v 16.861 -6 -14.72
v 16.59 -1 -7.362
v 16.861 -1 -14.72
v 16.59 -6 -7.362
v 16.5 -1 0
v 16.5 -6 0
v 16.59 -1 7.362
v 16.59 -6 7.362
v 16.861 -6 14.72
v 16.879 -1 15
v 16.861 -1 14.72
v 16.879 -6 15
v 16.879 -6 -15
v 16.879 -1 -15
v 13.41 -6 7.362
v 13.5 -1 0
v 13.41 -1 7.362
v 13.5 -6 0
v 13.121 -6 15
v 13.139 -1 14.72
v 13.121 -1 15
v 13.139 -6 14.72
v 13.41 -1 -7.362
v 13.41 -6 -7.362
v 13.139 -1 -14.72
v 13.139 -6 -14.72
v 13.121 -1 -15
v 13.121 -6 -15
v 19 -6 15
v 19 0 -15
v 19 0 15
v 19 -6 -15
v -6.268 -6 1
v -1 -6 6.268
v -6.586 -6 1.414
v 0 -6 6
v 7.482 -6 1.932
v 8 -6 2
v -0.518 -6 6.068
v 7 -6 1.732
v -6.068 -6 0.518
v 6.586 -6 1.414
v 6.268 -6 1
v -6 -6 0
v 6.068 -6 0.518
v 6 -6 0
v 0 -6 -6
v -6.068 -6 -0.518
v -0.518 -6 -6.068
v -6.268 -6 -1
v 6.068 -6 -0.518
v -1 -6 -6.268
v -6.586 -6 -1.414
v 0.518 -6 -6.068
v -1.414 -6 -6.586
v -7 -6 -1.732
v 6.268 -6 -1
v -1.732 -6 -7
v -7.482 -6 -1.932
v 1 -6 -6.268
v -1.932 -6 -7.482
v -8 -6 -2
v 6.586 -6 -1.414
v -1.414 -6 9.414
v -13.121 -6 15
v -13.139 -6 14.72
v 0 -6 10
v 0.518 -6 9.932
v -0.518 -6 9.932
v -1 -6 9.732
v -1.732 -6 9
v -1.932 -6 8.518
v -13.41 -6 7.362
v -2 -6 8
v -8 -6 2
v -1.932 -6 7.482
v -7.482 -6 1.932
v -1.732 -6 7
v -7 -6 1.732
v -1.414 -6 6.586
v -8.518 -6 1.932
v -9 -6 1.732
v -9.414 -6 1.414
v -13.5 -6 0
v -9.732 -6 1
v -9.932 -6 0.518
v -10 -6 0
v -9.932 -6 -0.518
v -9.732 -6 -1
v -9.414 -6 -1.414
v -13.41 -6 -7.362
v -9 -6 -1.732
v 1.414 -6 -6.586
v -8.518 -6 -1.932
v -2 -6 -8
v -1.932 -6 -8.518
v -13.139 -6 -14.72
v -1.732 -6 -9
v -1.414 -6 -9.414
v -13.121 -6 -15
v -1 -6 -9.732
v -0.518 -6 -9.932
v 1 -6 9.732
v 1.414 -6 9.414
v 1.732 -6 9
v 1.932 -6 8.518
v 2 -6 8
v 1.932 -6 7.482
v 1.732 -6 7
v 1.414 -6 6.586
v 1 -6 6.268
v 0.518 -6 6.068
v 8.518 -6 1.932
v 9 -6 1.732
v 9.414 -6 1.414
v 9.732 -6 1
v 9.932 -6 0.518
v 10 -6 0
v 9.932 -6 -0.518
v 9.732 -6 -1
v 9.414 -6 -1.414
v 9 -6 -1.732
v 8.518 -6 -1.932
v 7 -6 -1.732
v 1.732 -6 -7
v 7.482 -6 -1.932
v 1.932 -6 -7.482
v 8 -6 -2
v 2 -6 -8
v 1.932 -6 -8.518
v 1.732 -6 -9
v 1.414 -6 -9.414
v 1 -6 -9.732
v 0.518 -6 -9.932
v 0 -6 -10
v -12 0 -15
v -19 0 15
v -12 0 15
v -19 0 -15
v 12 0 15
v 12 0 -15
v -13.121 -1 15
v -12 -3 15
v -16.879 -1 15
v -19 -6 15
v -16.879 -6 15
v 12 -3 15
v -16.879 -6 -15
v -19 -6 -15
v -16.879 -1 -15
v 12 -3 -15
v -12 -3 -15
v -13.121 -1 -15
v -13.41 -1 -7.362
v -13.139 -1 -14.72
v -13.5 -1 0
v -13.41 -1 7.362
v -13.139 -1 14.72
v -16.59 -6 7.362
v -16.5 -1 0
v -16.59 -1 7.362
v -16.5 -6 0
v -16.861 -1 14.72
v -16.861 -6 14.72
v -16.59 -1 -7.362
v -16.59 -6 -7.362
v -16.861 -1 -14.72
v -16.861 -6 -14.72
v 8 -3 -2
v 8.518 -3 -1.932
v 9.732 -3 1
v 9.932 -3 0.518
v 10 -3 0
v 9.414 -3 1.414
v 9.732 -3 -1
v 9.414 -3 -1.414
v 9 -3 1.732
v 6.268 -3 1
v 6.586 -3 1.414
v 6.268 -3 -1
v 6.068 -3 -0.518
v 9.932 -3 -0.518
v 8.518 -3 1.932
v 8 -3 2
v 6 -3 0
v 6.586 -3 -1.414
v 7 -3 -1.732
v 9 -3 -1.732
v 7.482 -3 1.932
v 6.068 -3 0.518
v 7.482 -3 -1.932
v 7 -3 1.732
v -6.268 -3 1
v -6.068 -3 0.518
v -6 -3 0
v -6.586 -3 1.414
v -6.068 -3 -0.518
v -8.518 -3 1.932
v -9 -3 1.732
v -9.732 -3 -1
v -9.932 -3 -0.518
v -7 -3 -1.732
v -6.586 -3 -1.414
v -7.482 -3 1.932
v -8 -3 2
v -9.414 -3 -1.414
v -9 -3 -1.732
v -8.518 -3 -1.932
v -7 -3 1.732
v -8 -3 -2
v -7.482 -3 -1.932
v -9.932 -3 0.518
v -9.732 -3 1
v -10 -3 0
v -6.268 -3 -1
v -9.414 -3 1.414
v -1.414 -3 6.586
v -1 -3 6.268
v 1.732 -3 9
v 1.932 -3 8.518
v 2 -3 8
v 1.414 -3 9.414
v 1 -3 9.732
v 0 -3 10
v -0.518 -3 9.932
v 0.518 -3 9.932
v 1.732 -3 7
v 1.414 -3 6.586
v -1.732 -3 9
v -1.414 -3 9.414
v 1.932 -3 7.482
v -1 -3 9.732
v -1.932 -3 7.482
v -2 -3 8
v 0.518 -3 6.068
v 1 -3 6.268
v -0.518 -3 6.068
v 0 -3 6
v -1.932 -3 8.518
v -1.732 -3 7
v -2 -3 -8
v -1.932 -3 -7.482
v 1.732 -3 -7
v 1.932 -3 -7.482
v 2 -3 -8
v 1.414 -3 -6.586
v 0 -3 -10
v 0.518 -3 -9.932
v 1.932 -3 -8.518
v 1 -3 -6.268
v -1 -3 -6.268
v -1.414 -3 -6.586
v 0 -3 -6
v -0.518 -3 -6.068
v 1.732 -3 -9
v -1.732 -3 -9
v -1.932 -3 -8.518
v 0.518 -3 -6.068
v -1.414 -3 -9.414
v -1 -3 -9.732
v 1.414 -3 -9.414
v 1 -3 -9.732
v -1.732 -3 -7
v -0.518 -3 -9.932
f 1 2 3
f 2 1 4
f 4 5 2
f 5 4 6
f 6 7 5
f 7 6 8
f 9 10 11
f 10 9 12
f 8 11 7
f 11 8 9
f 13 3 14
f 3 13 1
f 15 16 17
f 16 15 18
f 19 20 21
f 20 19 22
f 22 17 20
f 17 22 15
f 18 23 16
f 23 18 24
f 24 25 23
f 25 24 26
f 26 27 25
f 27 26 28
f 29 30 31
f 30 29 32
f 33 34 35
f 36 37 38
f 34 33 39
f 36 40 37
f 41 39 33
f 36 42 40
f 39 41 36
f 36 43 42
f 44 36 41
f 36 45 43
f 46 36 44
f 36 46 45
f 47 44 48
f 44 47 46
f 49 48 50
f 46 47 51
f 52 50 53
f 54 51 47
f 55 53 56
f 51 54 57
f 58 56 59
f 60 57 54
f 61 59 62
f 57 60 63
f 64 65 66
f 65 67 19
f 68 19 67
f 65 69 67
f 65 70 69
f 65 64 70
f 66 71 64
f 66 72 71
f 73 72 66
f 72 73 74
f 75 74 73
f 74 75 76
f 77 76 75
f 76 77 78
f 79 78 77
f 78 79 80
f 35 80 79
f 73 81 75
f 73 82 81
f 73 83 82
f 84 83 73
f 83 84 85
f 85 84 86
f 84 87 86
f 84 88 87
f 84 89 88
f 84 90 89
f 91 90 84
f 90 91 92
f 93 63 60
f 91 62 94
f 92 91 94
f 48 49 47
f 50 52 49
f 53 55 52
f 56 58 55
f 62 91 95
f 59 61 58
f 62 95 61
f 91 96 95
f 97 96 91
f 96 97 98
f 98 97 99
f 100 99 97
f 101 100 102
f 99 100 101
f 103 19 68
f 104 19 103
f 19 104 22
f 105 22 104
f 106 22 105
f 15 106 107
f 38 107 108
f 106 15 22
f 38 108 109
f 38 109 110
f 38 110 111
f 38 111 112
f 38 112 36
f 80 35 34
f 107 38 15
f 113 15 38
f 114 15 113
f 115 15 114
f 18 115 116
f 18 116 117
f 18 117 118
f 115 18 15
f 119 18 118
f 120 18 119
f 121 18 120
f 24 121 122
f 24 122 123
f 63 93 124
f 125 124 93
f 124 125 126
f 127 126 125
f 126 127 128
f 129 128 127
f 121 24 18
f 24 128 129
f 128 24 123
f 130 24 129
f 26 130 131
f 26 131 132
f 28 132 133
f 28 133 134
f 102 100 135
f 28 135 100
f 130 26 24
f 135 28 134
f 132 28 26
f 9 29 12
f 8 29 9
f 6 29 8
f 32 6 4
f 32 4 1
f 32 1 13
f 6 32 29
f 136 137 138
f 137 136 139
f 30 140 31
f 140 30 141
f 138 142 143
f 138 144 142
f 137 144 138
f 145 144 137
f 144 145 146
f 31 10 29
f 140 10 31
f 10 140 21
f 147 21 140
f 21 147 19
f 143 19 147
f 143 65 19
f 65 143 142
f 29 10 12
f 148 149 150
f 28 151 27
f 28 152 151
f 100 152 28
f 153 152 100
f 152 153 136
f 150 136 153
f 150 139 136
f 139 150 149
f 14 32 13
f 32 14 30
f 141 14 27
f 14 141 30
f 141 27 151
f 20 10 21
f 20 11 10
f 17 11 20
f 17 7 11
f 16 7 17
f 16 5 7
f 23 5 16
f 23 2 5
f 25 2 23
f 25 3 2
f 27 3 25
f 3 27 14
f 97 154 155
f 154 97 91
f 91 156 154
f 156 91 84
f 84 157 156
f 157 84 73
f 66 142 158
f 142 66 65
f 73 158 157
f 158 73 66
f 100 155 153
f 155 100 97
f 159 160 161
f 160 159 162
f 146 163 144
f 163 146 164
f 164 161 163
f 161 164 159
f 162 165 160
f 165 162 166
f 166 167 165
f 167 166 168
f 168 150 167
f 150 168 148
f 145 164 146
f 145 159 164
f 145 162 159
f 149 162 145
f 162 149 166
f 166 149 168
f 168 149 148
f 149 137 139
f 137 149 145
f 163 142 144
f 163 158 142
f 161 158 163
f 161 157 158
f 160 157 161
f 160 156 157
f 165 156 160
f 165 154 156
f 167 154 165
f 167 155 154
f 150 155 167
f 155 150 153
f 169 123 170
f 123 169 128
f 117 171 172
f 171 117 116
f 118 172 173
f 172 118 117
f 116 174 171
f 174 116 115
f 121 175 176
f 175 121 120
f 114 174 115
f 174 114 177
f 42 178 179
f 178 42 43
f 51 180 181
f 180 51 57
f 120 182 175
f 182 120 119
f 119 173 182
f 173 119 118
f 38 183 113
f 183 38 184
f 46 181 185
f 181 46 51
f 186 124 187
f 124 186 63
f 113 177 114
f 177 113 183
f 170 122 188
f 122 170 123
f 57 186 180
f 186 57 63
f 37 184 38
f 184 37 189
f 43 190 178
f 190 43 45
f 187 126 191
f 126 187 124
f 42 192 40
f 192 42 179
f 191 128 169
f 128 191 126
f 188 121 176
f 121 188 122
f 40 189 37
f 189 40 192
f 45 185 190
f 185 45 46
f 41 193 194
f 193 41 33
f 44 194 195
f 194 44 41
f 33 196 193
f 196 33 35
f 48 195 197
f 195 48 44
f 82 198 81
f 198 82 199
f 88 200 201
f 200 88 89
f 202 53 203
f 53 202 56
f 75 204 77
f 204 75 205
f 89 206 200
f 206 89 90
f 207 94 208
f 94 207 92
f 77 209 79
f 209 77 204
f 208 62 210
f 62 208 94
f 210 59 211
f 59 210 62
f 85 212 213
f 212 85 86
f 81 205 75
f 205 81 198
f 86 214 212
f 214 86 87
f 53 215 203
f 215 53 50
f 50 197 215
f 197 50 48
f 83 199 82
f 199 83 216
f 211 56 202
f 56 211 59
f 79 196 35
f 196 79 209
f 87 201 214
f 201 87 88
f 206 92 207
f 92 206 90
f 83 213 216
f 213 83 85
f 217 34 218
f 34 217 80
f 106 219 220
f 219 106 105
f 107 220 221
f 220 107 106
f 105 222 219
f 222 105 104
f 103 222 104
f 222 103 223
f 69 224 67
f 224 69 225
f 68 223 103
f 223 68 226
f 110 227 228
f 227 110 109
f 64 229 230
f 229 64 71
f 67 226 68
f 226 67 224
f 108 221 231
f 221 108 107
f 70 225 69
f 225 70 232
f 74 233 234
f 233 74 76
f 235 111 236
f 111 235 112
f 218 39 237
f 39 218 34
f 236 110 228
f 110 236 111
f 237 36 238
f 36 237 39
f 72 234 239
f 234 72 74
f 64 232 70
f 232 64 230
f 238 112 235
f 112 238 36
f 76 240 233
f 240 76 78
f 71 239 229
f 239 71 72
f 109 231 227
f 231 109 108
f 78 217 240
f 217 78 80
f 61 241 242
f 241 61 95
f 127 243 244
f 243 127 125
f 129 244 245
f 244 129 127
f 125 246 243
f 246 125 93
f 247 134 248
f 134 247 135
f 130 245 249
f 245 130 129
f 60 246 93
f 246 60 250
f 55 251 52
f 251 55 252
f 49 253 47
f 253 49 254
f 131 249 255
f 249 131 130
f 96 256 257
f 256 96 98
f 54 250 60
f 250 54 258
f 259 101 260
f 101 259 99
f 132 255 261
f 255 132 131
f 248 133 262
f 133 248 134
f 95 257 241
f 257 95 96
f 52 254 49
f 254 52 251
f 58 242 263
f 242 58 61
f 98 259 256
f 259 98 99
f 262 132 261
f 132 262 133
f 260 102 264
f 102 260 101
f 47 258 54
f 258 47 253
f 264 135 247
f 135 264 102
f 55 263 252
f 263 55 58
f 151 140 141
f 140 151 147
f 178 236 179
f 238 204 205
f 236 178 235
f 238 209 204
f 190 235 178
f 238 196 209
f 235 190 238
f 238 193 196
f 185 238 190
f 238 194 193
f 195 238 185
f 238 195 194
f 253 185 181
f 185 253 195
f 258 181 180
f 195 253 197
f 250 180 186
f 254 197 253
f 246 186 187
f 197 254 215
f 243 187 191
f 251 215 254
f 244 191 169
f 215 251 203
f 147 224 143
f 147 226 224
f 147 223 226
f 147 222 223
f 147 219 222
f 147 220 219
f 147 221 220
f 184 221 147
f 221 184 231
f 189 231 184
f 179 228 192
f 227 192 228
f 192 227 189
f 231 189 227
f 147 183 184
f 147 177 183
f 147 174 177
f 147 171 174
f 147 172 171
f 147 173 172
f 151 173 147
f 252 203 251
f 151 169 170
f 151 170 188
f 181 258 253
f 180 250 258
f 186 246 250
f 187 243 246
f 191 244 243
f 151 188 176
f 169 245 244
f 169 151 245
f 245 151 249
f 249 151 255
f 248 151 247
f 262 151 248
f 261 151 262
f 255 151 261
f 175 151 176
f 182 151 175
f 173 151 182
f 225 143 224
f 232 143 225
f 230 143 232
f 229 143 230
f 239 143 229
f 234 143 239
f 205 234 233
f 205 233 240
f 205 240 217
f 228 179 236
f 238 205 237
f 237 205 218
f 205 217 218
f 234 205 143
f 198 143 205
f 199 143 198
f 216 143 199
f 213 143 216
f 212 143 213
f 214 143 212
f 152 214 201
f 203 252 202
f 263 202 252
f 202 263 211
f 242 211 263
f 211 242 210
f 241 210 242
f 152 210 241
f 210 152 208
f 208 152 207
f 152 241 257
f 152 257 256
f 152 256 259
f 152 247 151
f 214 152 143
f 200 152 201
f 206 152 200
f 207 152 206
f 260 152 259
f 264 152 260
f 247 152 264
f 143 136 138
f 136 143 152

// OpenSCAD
sliderWidth = 30;
sliderHeight = 30;
sliderDepth = 6;

tabWidth = 8;
tabGapWidth = 3;
tabRadius = 300.0;
tabDepth = 5;

lowerWidth = 24;
lowerDepth = 3;

upperWidth=24;
upperDepth=1;


holeOffset = 8;
holeRadius = 2;

bigHoleDepth = 1.5;
bigHoleRadius = 4.75;

tabFacets = 256;
holeFacets = 24;
blockFacets = 32;

//BigHoles();
Slider();

//translate([0,sliderHeight*1.25,0])
//    Slider();


module Slider()
{
    rotate([90,0,0])
    difference()
    {
        union() {
            translate([sliderWidth/2,0,0])
                Tab();
            translate([-sliderWidth/2,0,0])
                Tab();
            translate([0,0,sliderDepth/2])
                cube([sliderWidth-tabWidth,sliderHeight,sliderDepth],
                     center=true);

        }
        Holes();

        
  /*      translate([0,0,sliderDepth])
            RoundedBlock(upperWidth, 2*sliderHeight, 2*upperDepth);*/
        translate([0,0,0])
            RoundedBlock(lowerWidth, 2*sliderHeight, 2*lowerDepth);
    }
}

module Tab() {
    union() {
        translate([0,0,sliderDepth/2])
            intersection() {
                cube([tabWidth,sliderHeight,sliderDepth],
                     center = true);
                union() {
                    translate([tabRadius + tabGapWidth/2,0,0])
                        cylinder(h = sliderDepth*2, r = tabRadius, 
                                 center=true, $fn=tabFacets);
                    translate([-(tabRadius + tabGapWidth/2),0,0])
                        cylinder(h = sliderDepth*2, r = tabRadius, 
                                 center=true, $fn=tabFacets);

               }
           }
        translate([0,0,(sliderDepth-tabDepth)/2])
           cube([tabWidth,sliderHeight,(sliderDepth-tabDepth)], center=true);
   }
}

module Holes() {
    translate([holeOffset,0,0])
        cylinder(r=holeRadius,h=2*sliderDepth, center=true, $fn=holeFacets);
    translate([-holeOffset,0,0])
        cylinder(r=holeRadius,h=2*sliderDepth, center=true, $fn=holeFacets);
    translate([0,holeOffset,0])
        cylinder(r=holeRadius,h=2*sliderDepth, center=true, $fn=holeFacets);
    translate([0,-holeOffset,0])
        cylinder(r=holeRadius,h=2*sliderDepth, center=true, $fn=holeFacets);
}

module BigHoles() {/*
    rotate([0,180])
    translate([holeOffset,0,0])
        linear_extrude(height = 2*bigHoleDepth, center=true, scale=1.5)
        circle(r=bigHoleRadius,$fn=6);
    
    rotate([0,180])
    translate([-holeOffset,0,0])
        linear_extrude(height = 2*bigHoleDepth, center=true, scale=1.5)
        circle(r=bigHoleRadius,$fn=6);
    
    rotate([0,180])
    translate([0,holeOffset,0])
        linear_extrude(height = 2*bigHoleDepth, center=true, scale=1.5)
        circle(r=bigHoleRadius,$fn=6);
    
    rotate([0,180])
    translate([0,-holeOffset,0])
        linear_extrude(height = 2*bigHoleDepth, center=true, scale=1.5)
        circle(r=bigHoleRadius,$fn=6);
    */
    translate([holeOffset,0,0]) 
        rotate([0,0,30])   
            cylinder(r=bigHoleRadius,h=2*bigHoleDepth,
                     center=true, $fn=6);
    translate([-holeOffset,0,0])
        rotate([0,0,30])
            cylinder(r=bigHoleRadius,h=2*bigHoleDepth,
                     center=true, $fn=6);
    translate([0,holeOffset,0])
        rotate([0,0,30])
            cylinder(r=bigHoleRadius,h=2*bigHoleDepth,
                     center=true, $fn=6);
    translate([0,-holeOffset,0])
        rotate([0,0,30])
            cylinder(r=bigHoleRadius,h=2*bigHoleDepth,
                     center=true, $fn=6);
}

module RoundedBlock(width, length, height, radius)
{
    cube([width, length, height], center=true);
}
